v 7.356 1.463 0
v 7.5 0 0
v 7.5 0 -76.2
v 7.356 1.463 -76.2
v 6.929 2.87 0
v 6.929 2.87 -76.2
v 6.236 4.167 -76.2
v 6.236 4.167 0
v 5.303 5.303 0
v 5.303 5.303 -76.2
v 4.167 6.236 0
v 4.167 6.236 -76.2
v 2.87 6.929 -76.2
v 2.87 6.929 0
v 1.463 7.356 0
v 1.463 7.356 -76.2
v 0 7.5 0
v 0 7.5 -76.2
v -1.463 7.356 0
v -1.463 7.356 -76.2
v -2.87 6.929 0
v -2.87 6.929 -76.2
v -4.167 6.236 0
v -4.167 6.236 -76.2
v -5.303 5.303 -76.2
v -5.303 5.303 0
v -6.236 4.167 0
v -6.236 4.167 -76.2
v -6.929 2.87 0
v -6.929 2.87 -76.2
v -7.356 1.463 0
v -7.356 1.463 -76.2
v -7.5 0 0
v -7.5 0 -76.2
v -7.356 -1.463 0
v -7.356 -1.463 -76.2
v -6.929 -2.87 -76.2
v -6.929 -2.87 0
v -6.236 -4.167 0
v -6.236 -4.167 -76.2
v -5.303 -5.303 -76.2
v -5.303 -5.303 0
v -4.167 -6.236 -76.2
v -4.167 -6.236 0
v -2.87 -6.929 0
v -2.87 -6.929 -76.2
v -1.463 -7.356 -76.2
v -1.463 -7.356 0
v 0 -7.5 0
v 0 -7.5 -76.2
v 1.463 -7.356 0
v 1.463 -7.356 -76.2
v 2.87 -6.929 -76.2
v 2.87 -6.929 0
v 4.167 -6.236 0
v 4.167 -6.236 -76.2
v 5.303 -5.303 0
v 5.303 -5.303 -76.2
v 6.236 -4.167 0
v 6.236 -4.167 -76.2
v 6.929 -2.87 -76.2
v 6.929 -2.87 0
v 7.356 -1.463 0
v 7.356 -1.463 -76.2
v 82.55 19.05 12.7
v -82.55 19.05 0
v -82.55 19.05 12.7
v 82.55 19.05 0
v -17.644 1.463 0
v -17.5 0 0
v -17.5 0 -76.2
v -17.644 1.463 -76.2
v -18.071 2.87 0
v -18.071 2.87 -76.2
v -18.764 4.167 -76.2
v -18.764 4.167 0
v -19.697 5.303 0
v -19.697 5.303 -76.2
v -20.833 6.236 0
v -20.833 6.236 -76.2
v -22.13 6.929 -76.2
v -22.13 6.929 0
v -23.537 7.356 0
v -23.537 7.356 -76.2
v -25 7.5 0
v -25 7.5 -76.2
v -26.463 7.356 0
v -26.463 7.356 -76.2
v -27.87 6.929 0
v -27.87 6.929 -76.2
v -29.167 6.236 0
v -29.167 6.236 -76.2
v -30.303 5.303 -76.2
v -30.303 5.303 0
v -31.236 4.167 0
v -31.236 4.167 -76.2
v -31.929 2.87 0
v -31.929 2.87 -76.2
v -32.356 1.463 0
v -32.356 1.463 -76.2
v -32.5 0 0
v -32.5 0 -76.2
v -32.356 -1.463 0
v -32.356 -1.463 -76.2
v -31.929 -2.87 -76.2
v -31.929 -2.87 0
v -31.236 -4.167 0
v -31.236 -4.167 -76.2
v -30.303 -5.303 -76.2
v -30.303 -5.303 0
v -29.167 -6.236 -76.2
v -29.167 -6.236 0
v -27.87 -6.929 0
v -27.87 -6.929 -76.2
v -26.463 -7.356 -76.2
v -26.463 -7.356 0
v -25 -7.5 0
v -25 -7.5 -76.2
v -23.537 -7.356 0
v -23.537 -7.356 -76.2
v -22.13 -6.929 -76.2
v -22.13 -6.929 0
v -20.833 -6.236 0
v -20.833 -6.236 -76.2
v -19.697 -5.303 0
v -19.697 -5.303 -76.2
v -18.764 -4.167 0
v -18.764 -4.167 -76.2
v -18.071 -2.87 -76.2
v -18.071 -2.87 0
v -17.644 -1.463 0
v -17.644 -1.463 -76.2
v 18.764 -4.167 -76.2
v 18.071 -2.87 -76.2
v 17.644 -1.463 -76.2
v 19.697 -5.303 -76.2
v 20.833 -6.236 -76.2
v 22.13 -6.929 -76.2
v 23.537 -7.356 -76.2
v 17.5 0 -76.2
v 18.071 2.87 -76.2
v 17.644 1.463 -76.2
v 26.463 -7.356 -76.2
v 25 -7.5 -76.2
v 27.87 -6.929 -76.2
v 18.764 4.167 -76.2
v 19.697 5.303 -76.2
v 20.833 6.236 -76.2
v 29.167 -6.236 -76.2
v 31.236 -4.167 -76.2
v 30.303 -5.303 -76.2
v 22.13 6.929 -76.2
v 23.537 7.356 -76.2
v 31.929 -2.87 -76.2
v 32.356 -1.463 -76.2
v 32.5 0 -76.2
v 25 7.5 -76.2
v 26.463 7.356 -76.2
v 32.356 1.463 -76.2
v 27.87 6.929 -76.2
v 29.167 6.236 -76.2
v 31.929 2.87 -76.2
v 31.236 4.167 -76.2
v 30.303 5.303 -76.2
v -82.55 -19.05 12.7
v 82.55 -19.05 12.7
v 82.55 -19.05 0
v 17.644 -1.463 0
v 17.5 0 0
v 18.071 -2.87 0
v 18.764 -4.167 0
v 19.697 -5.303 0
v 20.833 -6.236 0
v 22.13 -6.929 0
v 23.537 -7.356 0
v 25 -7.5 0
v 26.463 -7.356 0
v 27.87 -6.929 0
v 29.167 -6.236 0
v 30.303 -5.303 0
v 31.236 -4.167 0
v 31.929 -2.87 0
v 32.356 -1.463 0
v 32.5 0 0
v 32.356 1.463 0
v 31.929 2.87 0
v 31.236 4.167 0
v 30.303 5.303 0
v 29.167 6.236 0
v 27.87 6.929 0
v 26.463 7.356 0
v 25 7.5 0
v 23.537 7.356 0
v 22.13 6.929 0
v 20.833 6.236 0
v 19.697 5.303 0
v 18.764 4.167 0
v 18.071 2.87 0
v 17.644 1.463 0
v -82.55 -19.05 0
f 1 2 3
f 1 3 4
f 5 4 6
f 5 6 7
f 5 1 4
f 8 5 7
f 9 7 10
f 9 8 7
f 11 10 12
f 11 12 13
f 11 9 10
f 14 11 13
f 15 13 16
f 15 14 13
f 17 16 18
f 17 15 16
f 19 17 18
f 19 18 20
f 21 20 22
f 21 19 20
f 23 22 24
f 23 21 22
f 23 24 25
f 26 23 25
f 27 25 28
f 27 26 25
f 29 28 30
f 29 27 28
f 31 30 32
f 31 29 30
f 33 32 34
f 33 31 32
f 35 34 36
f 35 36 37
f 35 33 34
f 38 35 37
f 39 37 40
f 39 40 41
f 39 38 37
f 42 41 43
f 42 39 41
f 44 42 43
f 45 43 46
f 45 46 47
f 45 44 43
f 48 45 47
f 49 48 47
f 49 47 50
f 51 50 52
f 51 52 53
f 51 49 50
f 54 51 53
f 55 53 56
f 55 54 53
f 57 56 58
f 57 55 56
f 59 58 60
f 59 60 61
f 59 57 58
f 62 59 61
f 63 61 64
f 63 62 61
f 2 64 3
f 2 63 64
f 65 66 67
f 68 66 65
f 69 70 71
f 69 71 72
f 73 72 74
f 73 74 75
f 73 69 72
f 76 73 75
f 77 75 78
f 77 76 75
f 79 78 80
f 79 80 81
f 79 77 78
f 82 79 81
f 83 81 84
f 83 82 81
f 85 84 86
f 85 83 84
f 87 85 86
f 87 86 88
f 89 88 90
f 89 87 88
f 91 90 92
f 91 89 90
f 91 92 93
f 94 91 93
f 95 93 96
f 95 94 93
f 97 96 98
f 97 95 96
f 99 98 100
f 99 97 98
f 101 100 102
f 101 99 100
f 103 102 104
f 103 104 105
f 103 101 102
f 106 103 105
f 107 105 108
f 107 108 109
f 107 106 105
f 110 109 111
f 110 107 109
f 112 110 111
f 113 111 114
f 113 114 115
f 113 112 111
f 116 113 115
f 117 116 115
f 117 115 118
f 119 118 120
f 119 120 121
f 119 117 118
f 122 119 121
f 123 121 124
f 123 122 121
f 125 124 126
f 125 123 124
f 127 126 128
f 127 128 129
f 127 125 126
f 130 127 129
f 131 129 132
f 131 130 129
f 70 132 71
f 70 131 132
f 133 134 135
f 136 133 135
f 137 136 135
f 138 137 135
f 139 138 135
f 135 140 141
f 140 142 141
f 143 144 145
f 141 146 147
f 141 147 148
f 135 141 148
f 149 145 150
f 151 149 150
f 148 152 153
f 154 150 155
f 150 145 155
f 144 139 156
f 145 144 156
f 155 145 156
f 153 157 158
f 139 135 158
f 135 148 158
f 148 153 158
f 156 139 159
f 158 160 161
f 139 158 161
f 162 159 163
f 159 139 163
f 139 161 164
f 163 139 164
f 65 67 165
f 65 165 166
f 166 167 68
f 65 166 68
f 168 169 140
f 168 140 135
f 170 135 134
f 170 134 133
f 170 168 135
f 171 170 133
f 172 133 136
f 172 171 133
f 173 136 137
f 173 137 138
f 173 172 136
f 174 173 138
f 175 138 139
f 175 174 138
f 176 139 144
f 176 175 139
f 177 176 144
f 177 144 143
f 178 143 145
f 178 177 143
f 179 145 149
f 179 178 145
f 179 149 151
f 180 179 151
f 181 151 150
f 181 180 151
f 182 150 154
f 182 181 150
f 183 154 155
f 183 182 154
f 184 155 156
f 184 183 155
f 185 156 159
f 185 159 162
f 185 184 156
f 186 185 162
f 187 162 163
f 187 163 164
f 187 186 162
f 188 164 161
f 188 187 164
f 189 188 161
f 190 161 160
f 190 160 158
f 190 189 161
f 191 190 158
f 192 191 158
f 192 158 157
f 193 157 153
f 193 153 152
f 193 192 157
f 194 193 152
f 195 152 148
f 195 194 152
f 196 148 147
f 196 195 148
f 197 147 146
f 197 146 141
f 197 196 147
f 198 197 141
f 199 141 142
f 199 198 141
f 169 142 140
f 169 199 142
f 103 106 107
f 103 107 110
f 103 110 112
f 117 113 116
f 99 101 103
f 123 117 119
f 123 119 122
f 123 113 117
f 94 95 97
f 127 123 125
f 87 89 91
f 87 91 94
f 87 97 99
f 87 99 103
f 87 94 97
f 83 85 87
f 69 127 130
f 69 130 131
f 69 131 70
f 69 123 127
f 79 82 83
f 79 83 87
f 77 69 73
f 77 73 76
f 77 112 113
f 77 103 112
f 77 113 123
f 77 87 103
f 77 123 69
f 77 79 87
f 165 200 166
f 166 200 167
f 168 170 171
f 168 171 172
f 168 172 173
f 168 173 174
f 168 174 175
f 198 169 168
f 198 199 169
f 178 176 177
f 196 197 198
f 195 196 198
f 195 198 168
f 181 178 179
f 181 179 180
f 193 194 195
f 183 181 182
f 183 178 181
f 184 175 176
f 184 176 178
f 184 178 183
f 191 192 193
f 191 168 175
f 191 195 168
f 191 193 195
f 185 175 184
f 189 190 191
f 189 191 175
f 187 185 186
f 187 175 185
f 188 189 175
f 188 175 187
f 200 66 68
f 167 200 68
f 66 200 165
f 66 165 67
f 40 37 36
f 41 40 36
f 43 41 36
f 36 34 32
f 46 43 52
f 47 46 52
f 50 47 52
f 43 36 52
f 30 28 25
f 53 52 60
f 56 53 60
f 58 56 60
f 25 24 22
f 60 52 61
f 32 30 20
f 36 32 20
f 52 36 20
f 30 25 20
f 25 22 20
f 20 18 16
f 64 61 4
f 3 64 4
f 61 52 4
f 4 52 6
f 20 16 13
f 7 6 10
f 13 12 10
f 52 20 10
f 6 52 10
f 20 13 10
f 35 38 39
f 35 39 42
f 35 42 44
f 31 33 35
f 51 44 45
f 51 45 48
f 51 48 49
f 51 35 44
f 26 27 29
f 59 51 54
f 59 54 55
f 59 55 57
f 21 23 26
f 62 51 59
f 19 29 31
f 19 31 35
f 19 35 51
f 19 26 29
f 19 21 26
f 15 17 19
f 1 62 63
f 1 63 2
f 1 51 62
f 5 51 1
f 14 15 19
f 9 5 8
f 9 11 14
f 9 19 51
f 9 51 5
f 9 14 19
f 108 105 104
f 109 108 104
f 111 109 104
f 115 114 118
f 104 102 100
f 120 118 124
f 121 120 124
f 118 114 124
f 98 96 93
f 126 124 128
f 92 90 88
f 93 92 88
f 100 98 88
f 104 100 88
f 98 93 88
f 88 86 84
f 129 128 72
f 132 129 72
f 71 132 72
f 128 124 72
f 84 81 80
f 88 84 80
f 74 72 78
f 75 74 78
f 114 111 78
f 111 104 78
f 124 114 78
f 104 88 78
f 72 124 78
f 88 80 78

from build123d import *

# Parameters (mm, degrees)
F0_W     = 165.1
F0_H     = 38.1
F0_R     = 7.5
F1_DEPTH = 12.7
F2_DEPTH = 76.2


with BuildPart() as f1:
    # F0 (on Top) → F1 (new body)
    with BuildSketch(Plane.XY):
        Rectangle(F0_W, F0_H)
        with Locations((-25, 0)):
            Circle(F0_R, mode=Mode.SUBTRACT)
        with BuildLine():
            ThreePointArc((-7.5, 0), (0, 7.5), (7.5, 0))
            ThreePointArc((7.5, 0), (0, -7.5), (-7.5, 0))
        make_face(mode=Mode.SUBTRACT)
        with BuildLine():
            ThreePointArc((32.5, 0), (25, -7.5), (17.5, 0))
            ThreePointArc((17.5, 0), (25, 7.5), (32.5, 0))
        make_face(mode=Mode.SUBTRACT)
        with BuildLine():
            ThreePointArc((-7.5, 0), (0, -7.5), (7.5, 0))
            ThreePointArc((7.5, 0), (0, 7.5), (-7.5, 0))
        make_face()
        with Locations((-25, 0)):
            Circle(F0_R)
        with BuildLine():
            ThreePointArc((32.5, 0), (25, 7.5), (17.5, 0))
            ThreePointArc((17.5, 0), (25, -7.5), (32.5, 0))
        make_face()
    extrude(amount=F1_DEPTH)


with BuildPart() as f2:
    # F0 (on Top) → F2 (new body)
    with BuildSketch(Plane.XY):
        with BuildLine():
            ThreePointArc((-7.5, 0), (0, -7.5), (7.5, 0))
            ThreePointArc((7.5, 0), (0, 7.5), (-7.5, 0))
        make_face()
    extrude(amount=-F2_DEPTH)


with BuildPart() as f2b:
    # F0 (on Top) → F2, piece 2 (new body)
    with BuildSketch(Plane.XY):
        with Locations((-25, 0)):
            Circle(F0_R)
    extrude(amount=-F2_DEPTH)


with BuildPart() as f2c:
    # F0 (on Top) → F2, piece 3 (new body)
    with BuildSketch(Plane.XY):
        with BuildLine():
            ThreePointArc((32.5, 0), (25, 7.5), (17.5, 0))
            ThreePointArc((17.5, 0), (25, -7.5), (32.5, 0))
        make_face()
    extrude(amount=-F2_DEPTH)


solid = Compound([f1.part, f2.part, f2b.part, f2c.part])
